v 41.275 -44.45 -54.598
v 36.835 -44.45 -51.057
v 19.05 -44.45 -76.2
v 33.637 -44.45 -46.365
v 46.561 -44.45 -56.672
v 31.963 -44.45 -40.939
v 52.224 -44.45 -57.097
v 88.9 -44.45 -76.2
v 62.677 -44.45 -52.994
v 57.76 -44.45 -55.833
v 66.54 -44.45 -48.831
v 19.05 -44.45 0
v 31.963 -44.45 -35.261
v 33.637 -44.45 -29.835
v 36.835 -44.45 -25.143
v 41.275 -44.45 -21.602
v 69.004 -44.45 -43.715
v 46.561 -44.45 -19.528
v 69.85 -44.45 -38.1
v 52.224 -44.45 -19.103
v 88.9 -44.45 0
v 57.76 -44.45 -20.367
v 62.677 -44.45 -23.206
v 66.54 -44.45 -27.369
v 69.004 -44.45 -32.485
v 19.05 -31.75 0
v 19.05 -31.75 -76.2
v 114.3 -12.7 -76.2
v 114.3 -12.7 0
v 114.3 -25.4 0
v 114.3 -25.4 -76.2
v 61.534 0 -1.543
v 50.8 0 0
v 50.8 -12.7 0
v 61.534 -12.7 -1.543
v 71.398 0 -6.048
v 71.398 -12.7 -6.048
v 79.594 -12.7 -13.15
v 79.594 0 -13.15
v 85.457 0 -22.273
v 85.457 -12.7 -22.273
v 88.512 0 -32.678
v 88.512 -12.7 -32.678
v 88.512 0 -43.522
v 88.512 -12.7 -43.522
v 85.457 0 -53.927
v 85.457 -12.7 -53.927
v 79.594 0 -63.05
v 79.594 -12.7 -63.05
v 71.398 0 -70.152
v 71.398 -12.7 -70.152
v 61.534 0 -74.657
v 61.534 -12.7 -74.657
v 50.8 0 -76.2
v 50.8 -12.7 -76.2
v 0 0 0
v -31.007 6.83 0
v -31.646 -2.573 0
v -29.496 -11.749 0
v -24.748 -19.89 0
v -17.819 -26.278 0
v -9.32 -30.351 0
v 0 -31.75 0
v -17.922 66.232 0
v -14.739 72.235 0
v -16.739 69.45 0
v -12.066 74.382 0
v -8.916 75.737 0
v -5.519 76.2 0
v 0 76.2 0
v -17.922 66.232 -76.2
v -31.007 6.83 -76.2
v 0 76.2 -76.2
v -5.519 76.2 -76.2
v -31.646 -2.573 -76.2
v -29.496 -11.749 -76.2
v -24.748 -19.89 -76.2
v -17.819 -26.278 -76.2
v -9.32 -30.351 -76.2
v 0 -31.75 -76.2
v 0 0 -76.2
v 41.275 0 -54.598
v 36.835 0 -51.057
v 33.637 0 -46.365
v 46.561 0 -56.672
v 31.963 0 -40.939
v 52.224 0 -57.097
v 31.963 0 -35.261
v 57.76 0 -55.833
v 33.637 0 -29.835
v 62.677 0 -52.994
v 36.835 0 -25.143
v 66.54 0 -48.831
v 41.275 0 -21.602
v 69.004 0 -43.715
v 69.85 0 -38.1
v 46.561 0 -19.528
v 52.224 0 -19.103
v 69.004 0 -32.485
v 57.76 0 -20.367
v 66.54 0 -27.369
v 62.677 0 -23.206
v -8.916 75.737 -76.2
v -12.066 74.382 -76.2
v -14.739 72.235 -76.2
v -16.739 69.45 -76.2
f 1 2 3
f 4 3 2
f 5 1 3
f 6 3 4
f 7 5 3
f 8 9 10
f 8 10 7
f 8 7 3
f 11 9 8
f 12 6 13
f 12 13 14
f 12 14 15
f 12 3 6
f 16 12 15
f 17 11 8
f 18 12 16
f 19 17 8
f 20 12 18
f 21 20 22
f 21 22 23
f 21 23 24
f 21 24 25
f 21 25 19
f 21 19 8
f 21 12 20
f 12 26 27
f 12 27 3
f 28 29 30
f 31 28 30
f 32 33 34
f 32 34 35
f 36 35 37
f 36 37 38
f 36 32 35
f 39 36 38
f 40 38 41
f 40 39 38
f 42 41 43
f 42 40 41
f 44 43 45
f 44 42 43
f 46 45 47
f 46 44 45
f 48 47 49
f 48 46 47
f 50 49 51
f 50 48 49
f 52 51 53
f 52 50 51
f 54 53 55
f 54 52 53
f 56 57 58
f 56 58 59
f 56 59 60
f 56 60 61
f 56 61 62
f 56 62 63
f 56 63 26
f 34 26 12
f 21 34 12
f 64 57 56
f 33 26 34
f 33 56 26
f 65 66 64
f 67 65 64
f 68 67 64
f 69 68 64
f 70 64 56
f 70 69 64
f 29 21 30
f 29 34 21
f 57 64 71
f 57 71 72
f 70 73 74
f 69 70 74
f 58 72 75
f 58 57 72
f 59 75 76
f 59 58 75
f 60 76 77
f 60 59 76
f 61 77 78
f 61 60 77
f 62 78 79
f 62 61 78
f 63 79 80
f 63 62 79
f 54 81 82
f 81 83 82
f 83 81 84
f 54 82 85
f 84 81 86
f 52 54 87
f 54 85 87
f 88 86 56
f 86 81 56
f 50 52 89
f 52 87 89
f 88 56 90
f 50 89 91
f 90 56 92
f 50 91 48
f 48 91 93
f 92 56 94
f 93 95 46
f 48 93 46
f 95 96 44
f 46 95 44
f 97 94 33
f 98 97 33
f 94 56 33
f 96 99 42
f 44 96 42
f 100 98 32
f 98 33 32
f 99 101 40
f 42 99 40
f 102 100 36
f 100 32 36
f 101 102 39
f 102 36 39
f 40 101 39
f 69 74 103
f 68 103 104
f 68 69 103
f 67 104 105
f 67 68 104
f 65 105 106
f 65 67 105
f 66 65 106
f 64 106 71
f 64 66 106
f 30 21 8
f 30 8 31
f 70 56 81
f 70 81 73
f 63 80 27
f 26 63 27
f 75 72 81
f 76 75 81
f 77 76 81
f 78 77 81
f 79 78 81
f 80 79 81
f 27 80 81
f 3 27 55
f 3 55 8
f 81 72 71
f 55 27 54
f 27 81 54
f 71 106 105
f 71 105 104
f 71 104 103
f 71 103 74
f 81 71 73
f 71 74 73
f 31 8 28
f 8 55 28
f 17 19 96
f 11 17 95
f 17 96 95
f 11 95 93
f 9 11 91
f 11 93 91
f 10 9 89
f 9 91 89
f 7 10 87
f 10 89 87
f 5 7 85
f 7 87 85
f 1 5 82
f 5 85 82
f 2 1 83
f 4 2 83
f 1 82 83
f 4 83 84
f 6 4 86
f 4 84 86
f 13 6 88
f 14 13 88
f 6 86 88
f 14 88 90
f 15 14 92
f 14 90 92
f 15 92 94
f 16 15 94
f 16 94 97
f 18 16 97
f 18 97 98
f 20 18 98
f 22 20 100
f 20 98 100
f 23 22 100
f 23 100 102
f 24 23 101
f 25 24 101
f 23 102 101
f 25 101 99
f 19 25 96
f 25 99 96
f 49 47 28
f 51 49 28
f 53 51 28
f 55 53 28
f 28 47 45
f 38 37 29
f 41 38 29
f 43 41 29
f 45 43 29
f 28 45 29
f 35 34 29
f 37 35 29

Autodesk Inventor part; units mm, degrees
ref_plane "YZ Plane" through (0, 0, 0) normal (1, 0, 0) x (0, 1, 0)
ref_plane "XZ Plane" through (0, 0, 0) normal (0, 1, 0) x (-1, 0, 0)
ref_plane "XY Plane" through (0, 0, 0) normal (0, 0, 1) x (1, 0, 0)
sketch "Sketch1" plane through (0, 0, 0) normal (0, 0, 1) x (1, 0, 0)
  line L0 (0, 0) -> (0, 76.2)
  line L1 (0, 0) -> (50.8, 0)
  line L2 (50.8, 0) -> (50.8, -12.7)
  line L3 (50.8, -12.7) -> (114.3, -12.7)
  line L4 (114.3, -12.7) -> (114.3, -25.4)
  line L5 (0, 76.2) -> (-5.5192, 76.2)
  arc A0 (-5.5192, 76.2) -> (-17.9219, 66.232) centre (-5.5192, 63.5) ccw
  arc A1 (-31.0067, 6.83) -> (0, -31.75) centre (0, 0) ccw
  line L6 (-17.9219, 66.232) -> (-31.0067, 6.83)
  line L7 (0, -31.75) -> (19.05, -31.75)
  line L8 (6.35, -31.1085) -> (6.35, -31.75)
  line L9 (19.05, -31.75) -> (19.05, -44.45)
  line L10 (19.05, -44.45) -> (88.9, -44.45)
  line L11 (88.9, -44.45) -> (114.3, -25.4)
  dimension "d0" = 76.2
  dimension "d1" = 50.8
  dimension "d2" = 12.7
  dimension "d3" = 63.5
  dimension "d4" = 12.7
  dimension "d13" = 19.05
  dimension "d15" = 12.7
  dimension "d16" = 69.85
  dimension "d17" = 31.75
  dimension "d18" = 59.402
extrude "Extrusion1" add sketch "Sketch1" against normal blind 76.2
sketch "Sketch2" plane through (0, 0, 0) normal (0, 1, 0) x (1, 0, 0)
  line L0 (50.8, 0) -> (50.8, 76.2) projected
  circle A0 centre (50.8, 38.1) radius 38.1
  point P0 (0, 0)
extrude "Extrusion2" add sketch "Sketch2" against normal blind 12.7
sketch "Sketch3" plane through (0, 0, 0) normal (0, 1, 0) x (1, 0, 0)
  arc A0 (50.8, 0) -> (50.8, 76.2) centre (50.8, 38.1) ccw projected
  circle A1 centre (50.8, 38.1) radius 19.05
  point P0 (0, 0)
  dimension "d24" = 38.1
extrude "Extrusion3" cut sketch "Sketch3" against normal through all
properties part number "5.4"
